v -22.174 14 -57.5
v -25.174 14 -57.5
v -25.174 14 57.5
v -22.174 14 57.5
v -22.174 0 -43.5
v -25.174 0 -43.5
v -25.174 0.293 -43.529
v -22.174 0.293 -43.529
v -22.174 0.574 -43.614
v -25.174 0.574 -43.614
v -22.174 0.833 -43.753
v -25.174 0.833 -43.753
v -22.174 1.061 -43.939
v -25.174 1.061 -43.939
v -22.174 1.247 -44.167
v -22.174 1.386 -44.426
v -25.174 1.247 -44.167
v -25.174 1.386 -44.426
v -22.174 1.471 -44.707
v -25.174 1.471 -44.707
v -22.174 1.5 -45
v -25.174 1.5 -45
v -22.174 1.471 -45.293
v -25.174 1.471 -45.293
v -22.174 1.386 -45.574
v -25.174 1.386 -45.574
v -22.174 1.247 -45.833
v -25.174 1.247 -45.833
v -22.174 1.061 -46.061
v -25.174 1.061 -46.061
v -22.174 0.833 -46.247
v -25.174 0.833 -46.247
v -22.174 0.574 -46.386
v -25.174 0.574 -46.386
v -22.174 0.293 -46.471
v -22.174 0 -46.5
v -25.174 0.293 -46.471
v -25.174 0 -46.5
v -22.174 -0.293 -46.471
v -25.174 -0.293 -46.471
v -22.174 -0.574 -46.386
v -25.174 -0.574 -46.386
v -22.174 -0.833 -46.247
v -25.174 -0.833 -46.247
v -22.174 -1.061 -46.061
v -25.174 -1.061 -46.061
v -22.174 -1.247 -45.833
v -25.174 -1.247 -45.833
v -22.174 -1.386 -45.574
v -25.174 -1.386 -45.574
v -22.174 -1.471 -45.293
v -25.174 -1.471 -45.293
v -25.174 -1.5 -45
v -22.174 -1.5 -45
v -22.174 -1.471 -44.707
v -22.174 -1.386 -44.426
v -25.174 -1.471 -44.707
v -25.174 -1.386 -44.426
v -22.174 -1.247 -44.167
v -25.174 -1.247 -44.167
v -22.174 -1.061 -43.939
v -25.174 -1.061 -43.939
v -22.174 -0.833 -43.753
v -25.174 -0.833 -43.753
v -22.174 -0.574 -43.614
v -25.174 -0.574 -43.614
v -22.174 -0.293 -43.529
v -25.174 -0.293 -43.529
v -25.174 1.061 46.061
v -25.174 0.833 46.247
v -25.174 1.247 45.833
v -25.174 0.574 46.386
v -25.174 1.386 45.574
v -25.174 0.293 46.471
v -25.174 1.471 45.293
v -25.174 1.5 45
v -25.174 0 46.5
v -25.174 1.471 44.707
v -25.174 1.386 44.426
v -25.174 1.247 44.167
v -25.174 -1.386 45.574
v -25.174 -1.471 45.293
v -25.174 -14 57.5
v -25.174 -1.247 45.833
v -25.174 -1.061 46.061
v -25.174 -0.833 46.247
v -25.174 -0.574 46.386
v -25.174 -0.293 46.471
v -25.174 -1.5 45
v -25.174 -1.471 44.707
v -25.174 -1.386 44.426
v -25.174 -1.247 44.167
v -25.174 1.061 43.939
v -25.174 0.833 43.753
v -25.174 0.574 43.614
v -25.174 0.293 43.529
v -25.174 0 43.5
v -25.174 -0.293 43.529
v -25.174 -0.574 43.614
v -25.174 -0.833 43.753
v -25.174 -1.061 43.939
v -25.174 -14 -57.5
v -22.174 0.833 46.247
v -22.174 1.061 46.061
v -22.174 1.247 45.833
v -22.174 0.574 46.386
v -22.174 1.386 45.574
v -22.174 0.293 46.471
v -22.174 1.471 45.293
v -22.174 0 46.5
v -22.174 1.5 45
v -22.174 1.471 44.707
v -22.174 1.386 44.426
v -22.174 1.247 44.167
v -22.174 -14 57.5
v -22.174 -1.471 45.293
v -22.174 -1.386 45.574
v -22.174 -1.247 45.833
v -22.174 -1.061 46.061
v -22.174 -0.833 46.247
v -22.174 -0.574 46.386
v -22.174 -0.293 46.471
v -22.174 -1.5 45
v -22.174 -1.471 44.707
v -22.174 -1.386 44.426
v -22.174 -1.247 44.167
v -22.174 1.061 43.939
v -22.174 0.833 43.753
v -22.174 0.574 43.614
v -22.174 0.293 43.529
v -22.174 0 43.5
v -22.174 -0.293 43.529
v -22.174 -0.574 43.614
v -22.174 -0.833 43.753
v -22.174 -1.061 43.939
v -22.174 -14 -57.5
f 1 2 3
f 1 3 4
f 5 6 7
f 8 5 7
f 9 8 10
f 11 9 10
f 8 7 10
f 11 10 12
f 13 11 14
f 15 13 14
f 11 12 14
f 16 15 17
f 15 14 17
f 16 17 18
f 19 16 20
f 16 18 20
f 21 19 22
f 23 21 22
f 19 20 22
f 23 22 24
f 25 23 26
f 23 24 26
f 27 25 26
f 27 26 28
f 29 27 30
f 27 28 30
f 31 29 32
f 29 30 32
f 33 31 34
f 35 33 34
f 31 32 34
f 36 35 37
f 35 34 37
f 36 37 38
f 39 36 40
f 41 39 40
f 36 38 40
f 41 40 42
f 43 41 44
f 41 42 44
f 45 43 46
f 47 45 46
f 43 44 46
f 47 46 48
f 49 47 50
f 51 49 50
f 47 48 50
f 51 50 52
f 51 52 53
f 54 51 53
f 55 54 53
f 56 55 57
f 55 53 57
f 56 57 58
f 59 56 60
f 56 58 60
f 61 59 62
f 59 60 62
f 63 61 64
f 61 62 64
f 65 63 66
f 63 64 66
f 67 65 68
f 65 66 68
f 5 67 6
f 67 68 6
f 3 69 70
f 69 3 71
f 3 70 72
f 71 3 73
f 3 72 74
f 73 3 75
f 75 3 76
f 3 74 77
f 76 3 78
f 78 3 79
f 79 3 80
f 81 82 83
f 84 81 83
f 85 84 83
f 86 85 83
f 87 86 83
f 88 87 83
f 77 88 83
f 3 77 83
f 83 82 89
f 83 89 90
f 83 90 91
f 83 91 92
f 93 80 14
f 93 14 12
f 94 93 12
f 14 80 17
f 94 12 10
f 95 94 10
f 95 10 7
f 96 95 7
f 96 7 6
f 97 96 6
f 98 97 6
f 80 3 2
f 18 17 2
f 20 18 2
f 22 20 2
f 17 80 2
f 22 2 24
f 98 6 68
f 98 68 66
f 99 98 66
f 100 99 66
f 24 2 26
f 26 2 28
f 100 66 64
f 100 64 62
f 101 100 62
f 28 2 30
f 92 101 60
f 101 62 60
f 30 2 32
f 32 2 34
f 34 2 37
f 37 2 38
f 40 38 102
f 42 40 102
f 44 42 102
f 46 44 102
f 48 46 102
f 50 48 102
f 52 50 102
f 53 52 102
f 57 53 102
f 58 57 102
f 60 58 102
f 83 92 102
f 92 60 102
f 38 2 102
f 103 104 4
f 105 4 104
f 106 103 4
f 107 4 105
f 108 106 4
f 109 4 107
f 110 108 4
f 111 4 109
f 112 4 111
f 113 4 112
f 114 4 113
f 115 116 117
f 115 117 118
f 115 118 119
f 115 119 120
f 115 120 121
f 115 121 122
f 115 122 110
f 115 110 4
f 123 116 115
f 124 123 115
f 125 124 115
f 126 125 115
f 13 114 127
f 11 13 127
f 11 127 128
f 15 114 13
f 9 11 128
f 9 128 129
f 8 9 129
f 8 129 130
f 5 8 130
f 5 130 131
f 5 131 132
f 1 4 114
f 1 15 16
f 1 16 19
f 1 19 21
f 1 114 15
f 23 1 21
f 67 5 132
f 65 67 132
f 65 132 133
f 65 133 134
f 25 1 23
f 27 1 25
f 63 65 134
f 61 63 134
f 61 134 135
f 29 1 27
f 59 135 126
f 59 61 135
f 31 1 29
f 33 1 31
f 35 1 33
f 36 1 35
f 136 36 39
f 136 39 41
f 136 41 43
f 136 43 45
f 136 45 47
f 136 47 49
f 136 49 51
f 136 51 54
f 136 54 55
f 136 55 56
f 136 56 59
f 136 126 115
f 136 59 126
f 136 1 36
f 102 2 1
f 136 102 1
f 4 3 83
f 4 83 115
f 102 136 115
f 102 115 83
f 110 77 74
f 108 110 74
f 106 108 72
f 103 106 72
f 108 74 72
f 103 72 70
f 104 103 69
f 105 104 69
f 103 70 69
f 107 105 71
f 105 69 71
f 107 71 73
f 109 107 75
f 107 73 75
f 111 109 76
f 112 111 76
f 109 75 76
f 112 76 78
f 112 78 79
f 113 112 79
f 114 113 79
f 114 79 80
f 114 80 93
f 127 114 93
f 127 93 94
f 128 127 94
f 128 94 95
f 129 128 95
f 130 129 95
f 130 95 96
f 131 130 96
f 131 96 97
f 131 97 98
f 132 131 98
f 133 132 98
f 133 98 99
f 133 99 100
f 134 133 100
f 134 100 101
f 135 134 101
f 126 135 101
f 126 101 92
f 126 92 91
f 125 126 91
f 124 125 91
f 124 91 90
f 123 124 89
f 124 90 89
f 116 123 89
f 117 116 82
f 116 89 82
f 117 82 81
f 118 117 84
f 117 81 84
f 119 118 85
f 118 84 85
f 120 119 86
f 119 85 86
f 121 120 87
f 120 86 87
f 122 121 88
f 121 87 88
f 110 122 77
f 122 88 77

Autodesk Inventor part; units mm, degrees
ref_plane "YZ Plane" through (0, 0, 0) normal (1, 0, 0) x (0, 1, 0)
ref_plane "XZ Plane" through (0, 0, 0) normal (0, 1, 0) x (-1, 0, 0)
ref_plane "XY Plane" through (0, 0, 0) normal (0, 0, 1) x (1, 0, 0)
sketch "Sketch1" plane through (0, 0, 0) normal (0, 0, 1) x (1, 0, 0)
  line L0 (-25.1745, 14) -> (-25.1745, -14) projected
  line L1 (-25.1745, 14) -> (-22.1745, 14)
  line L2 (-22.1745, 14) -> (-22.1745, -14)
  line L3 (-22.1745, -14) -> (-25.1745, -14)
  line L4 (-25.1745, -14) -> (-25.1745, 14)
  point P0 (0, 0)
  dimension "d0" = 3
  dimension "d1" = 28
extrude "Extrusion1" add sketch "Sketch1" along normal mid plane 115
sketch "Sketch2" plane through (-25.1745, -14, 57.5) normal (-1, 0, 0) x (0, 0, 1)
  line L0 (-115, 0) -> (-115, 28) construction
  line L1 (0, 28) -> (0, 0) construction
  line L2 (0, 0) -> (-115, 0) construction
  line L3 (-115, 28) -> (0, 28) construction
  line L4 (-57.5, 0) -> (-57.5, 28) construction
  circle A0 centre (-12.5, 14) radius 1.5
  circle A1 centre (-102.5, 14) radius 1.5
  point P0 (-57.5, 14)
  dimension "d4" = 3
  dimension "d5" = 12.5
  dimension "d6" = 14
extrude "Extrusion2" cut sketch "Sketch2" against normal blind 10
properties part number "Mechanum support lock bar"
